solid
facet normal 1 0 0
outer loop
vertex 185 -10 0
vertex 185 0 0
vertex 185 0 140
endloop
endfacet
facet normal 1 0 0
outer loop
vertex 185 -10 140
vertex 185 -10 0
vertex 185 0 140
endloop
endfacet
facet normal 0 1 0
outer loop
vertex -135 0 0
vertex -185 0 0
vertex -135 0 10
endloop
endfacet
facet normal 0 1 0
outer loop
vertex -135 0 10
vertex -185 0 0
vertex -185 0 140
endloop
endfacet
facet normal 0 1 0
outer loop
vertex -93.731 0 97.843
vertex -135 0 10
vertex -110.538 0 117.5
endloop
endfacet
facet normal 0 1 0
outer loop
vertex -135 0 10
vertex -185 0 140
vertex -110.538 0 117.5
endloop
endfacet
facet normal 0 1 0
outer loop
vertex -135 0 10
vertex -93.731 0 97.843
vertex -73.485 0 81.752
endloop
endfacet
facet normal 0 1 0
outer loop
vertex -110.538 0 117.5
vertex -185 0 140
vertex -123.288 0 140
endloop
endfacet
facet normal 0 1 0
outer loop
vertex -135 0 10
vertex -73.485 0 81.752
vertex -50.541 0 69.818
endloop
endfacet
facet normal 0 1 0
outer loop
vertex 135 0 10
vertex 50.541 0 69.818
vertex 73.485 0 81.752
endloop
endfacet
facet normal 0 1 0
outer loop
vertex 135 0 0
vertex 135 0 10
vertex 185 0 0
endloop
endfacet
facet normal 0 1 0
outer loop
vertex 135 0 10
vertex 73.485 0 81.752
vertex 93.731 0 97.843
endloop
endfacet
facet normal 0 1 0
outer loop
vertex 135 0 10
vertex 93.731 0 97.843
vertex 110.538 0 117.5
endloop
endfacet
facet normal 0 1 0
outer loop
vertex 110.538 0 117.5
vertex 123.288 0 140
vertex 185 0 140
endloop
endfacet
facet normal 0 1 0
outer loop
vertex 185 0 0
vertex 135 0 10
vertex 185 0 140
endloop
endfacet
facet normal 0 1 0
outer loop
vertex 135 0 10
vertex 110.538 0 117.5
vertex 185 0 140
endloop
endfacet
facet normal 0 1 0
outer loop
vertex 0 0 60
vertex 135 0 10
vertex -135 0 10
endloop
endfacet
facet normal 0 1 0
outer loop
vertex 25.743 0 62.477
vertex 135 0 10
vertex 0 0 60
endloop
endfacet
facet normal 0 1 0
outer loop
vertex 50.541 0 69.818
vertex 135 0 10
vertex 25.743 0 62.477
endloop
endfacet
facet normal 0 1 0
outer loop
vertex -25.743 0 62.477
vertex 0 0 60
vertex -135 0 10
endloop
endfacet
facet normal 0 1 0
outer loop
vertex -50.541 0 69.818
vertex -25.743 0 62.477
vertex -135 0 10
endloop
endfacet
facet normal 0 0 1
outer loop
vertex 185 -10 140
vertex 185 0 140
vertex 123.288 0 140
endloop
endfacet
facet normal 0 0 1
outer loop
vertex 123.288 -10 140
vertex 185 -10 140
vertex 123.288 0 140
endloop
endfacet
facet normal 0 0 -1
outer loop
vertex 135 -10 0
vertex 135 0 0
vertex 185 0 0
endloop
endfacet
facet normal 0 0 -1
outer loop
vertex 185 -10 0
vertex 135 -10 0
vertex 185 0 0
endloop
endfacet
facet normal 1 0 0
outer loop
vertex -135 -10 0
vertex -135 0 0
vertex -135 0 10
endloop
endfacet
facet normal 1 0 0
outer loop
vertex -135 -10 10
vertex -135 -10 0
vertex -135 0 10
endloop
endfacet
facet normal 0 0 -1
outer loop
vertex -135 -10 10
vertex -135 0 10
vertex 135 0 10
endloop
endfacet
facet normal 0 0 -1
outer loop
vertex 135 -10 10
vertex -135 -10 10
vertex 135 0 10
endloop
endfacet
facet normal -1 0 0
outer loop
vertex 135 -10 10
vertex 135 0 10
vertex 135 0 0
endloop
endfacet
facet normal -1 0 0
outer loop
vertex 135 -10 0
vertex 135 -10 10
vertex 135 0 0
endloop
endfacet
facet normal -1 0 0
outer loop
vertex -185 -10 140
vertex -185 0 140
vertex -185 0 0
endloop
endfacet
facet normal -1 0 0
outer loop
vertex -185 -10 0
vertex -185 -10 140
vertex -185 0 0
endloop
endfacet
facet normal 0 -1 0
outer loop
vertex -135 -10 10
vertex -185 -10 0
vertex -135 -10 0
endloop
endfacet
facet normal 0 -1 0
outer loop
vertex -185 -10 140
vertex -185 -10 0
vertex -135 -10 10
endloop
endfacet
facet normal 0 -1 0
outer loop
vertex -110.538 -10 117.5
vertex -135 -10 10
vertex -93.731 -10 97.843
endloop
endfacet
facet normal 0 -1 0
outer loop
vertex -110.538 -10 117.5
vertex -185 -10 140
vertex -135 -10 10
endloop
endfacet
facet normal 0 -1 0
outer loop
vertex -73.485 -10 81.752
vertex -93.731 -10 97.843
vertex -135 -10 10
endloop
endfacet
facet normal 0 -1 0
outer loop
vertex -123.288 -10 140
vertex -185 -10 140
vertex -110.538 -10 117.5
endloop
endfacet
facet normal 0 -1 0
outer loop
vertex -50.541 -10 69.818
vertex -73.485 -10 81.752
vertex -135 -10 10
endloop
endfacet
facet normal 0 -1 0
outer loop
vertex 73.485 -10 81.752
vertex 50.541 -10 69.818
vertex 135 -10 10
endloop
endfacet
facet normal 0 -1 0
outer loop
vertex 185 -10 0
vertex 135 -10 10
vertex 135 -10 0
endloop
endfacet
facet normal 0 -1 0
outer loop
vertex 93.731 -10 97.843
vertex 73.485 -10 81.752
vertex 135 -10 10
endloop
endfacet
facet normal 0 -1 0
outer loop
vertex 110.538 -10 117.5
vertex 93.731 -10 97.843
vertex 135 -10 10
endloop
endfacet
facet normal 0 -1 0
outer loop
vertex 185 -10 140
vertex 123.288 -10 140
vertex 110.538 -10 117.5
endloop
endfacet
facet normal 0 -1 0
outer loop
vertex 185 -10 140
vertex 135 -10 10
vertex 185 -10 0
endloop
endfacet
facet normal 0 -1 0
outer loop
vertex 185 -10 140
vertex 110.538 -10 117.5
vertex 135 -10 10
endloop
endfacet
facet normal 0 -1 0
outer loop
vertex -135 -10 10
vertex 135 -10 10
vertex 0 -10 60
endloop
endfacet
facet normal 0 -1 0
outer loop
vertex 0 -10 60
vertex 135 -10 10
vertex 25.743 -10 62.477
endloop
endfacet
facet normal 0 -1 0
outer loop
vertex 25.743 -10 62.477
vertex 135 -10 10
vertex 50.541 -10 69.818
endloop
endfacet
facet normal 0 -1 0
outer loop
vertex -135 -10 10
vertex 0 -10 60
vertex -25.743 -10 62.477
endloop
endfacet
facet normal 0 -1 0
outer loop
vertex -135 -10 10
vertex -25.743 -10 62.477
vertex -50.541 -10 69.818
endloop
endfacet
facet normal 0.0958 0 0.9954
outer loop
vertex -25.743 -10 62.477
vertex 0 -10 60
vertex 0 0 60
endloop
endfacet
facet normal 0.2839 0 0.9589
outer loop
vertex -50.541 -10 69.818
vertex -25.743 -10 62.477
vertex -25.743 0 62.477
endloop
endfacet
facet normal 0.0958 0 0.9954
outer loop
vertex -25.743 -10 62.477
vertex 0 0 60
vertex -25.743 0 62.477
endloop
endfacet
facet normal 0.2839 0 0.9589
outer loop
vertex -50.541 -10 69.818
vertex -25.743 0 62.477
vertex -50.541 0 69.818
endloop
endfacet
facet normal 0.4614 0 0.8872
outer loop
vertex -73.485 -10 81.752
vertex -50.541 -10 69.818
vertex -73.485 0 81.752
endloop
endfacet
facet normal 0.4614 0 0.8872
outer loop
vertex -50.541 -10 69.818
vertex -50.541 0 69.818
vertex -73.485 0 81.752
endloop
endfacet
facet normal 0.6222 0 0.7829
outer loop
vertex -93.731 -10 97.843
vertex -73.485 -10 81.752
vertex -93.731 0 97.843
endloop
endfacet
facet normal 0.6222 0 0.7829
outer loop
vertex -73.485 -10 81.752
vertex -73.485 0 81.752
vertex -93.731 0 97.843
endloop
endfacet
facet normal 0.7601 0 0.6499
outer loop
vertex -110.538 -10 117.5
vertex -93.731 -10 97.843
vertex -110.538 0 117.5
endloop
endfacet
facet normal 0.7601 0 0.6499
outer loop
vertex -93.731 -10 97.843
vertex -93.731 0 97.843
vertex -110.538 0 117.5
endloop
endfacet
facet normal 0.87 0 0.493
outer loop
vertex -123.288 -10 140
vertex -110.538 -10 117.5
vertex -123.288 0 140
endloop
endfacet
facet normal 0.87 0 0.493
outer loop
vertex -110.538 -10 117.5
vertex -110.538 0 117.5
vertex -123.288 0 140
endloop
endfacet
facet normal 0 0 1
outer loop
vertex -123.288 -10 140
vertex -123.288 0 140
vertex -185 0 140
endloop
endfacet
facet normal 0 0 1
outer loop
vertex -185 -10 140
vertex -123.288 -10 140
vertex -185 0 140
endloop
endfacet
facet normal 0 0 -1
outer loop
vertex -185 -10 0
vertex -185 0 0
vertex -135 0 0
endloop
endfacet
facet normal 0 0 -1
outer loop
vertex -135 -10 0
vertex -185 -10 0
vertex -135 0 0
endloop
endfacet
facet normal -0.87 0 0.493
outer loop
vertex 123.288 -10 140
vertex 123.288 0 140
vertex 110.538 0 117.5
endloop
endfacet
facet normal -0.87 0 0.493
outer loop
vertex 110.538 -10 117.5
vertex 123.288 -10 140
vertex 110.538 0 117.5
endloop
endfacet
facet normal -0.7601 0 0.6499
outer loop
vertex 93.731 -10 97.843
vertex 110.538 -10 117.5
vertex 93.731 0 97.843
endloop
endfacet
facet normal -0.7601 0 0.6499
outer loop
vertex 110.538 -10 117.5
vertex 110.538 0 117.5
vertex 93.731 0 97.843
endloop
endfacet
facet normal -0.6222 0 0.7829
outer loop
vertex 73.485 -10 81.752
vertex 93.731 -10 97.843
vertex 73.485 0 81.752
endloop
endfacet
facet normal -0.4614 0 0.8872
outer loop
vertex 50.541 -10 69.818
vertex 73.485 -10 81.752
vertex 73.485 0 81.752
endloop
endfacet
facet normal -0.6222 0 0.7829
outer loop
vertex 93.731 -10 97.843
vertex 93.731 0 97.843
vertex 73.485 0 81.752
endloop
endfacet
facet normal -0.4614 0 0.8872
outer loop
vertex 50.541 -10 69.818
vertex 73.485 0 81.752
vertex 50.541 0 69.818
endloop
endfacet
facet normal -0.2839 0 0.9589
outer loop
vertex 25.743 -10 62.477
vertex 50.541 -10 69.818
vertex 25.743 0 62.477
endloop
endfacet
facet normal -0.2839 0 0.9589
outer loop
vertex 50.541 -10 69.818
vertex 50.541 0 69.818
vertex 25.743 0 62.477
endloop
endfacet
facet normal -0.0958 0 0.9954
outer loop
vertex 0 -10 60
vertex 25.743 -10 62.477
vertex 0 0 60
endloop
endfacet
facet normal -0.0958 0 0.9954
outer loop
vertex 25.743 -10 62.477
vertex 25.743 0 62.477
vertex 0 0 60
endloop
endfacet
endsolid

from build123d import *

# Parameters (mm, degrees)
F1_DEPTH = 10


with BuildPart() as f1:
    # F0 (on Front) → F1 (new body)
    with BuildSketch(Plane.XZ):
        with BuildLine():
            Line((-135, 10), (0, 10))
            Line((0, 10), (0, 60))
            ThreePointArc((0, 60), (-73.4846922835, 81.7524834709), (-123.2882800594, 140))
            Line((-123.2882800594, 140), (-185, 140))
            Line((-185, 140), (-185, 0))
            Line((-185, 0), (-135, 0))
            Line((-135, 0), (-135, 10))
        make_face()
        with BuildLine():
            Line((135, 10), (135, 0))
            Line((135, 0), (185, 0))
            Line((185, 0), (185, 140))
            Line((185, 140), (123.2882800594, 140))
            ThreePointArc((123.2882800594, 140), (73.4846922835, 81.7524834709), (0, 60))
            Line((0, 60), (0, 10))
            Line((0, 10), (135, 10))
        make_face()
    extrude(amount=F1_DEPTH)


solid = f1.part
